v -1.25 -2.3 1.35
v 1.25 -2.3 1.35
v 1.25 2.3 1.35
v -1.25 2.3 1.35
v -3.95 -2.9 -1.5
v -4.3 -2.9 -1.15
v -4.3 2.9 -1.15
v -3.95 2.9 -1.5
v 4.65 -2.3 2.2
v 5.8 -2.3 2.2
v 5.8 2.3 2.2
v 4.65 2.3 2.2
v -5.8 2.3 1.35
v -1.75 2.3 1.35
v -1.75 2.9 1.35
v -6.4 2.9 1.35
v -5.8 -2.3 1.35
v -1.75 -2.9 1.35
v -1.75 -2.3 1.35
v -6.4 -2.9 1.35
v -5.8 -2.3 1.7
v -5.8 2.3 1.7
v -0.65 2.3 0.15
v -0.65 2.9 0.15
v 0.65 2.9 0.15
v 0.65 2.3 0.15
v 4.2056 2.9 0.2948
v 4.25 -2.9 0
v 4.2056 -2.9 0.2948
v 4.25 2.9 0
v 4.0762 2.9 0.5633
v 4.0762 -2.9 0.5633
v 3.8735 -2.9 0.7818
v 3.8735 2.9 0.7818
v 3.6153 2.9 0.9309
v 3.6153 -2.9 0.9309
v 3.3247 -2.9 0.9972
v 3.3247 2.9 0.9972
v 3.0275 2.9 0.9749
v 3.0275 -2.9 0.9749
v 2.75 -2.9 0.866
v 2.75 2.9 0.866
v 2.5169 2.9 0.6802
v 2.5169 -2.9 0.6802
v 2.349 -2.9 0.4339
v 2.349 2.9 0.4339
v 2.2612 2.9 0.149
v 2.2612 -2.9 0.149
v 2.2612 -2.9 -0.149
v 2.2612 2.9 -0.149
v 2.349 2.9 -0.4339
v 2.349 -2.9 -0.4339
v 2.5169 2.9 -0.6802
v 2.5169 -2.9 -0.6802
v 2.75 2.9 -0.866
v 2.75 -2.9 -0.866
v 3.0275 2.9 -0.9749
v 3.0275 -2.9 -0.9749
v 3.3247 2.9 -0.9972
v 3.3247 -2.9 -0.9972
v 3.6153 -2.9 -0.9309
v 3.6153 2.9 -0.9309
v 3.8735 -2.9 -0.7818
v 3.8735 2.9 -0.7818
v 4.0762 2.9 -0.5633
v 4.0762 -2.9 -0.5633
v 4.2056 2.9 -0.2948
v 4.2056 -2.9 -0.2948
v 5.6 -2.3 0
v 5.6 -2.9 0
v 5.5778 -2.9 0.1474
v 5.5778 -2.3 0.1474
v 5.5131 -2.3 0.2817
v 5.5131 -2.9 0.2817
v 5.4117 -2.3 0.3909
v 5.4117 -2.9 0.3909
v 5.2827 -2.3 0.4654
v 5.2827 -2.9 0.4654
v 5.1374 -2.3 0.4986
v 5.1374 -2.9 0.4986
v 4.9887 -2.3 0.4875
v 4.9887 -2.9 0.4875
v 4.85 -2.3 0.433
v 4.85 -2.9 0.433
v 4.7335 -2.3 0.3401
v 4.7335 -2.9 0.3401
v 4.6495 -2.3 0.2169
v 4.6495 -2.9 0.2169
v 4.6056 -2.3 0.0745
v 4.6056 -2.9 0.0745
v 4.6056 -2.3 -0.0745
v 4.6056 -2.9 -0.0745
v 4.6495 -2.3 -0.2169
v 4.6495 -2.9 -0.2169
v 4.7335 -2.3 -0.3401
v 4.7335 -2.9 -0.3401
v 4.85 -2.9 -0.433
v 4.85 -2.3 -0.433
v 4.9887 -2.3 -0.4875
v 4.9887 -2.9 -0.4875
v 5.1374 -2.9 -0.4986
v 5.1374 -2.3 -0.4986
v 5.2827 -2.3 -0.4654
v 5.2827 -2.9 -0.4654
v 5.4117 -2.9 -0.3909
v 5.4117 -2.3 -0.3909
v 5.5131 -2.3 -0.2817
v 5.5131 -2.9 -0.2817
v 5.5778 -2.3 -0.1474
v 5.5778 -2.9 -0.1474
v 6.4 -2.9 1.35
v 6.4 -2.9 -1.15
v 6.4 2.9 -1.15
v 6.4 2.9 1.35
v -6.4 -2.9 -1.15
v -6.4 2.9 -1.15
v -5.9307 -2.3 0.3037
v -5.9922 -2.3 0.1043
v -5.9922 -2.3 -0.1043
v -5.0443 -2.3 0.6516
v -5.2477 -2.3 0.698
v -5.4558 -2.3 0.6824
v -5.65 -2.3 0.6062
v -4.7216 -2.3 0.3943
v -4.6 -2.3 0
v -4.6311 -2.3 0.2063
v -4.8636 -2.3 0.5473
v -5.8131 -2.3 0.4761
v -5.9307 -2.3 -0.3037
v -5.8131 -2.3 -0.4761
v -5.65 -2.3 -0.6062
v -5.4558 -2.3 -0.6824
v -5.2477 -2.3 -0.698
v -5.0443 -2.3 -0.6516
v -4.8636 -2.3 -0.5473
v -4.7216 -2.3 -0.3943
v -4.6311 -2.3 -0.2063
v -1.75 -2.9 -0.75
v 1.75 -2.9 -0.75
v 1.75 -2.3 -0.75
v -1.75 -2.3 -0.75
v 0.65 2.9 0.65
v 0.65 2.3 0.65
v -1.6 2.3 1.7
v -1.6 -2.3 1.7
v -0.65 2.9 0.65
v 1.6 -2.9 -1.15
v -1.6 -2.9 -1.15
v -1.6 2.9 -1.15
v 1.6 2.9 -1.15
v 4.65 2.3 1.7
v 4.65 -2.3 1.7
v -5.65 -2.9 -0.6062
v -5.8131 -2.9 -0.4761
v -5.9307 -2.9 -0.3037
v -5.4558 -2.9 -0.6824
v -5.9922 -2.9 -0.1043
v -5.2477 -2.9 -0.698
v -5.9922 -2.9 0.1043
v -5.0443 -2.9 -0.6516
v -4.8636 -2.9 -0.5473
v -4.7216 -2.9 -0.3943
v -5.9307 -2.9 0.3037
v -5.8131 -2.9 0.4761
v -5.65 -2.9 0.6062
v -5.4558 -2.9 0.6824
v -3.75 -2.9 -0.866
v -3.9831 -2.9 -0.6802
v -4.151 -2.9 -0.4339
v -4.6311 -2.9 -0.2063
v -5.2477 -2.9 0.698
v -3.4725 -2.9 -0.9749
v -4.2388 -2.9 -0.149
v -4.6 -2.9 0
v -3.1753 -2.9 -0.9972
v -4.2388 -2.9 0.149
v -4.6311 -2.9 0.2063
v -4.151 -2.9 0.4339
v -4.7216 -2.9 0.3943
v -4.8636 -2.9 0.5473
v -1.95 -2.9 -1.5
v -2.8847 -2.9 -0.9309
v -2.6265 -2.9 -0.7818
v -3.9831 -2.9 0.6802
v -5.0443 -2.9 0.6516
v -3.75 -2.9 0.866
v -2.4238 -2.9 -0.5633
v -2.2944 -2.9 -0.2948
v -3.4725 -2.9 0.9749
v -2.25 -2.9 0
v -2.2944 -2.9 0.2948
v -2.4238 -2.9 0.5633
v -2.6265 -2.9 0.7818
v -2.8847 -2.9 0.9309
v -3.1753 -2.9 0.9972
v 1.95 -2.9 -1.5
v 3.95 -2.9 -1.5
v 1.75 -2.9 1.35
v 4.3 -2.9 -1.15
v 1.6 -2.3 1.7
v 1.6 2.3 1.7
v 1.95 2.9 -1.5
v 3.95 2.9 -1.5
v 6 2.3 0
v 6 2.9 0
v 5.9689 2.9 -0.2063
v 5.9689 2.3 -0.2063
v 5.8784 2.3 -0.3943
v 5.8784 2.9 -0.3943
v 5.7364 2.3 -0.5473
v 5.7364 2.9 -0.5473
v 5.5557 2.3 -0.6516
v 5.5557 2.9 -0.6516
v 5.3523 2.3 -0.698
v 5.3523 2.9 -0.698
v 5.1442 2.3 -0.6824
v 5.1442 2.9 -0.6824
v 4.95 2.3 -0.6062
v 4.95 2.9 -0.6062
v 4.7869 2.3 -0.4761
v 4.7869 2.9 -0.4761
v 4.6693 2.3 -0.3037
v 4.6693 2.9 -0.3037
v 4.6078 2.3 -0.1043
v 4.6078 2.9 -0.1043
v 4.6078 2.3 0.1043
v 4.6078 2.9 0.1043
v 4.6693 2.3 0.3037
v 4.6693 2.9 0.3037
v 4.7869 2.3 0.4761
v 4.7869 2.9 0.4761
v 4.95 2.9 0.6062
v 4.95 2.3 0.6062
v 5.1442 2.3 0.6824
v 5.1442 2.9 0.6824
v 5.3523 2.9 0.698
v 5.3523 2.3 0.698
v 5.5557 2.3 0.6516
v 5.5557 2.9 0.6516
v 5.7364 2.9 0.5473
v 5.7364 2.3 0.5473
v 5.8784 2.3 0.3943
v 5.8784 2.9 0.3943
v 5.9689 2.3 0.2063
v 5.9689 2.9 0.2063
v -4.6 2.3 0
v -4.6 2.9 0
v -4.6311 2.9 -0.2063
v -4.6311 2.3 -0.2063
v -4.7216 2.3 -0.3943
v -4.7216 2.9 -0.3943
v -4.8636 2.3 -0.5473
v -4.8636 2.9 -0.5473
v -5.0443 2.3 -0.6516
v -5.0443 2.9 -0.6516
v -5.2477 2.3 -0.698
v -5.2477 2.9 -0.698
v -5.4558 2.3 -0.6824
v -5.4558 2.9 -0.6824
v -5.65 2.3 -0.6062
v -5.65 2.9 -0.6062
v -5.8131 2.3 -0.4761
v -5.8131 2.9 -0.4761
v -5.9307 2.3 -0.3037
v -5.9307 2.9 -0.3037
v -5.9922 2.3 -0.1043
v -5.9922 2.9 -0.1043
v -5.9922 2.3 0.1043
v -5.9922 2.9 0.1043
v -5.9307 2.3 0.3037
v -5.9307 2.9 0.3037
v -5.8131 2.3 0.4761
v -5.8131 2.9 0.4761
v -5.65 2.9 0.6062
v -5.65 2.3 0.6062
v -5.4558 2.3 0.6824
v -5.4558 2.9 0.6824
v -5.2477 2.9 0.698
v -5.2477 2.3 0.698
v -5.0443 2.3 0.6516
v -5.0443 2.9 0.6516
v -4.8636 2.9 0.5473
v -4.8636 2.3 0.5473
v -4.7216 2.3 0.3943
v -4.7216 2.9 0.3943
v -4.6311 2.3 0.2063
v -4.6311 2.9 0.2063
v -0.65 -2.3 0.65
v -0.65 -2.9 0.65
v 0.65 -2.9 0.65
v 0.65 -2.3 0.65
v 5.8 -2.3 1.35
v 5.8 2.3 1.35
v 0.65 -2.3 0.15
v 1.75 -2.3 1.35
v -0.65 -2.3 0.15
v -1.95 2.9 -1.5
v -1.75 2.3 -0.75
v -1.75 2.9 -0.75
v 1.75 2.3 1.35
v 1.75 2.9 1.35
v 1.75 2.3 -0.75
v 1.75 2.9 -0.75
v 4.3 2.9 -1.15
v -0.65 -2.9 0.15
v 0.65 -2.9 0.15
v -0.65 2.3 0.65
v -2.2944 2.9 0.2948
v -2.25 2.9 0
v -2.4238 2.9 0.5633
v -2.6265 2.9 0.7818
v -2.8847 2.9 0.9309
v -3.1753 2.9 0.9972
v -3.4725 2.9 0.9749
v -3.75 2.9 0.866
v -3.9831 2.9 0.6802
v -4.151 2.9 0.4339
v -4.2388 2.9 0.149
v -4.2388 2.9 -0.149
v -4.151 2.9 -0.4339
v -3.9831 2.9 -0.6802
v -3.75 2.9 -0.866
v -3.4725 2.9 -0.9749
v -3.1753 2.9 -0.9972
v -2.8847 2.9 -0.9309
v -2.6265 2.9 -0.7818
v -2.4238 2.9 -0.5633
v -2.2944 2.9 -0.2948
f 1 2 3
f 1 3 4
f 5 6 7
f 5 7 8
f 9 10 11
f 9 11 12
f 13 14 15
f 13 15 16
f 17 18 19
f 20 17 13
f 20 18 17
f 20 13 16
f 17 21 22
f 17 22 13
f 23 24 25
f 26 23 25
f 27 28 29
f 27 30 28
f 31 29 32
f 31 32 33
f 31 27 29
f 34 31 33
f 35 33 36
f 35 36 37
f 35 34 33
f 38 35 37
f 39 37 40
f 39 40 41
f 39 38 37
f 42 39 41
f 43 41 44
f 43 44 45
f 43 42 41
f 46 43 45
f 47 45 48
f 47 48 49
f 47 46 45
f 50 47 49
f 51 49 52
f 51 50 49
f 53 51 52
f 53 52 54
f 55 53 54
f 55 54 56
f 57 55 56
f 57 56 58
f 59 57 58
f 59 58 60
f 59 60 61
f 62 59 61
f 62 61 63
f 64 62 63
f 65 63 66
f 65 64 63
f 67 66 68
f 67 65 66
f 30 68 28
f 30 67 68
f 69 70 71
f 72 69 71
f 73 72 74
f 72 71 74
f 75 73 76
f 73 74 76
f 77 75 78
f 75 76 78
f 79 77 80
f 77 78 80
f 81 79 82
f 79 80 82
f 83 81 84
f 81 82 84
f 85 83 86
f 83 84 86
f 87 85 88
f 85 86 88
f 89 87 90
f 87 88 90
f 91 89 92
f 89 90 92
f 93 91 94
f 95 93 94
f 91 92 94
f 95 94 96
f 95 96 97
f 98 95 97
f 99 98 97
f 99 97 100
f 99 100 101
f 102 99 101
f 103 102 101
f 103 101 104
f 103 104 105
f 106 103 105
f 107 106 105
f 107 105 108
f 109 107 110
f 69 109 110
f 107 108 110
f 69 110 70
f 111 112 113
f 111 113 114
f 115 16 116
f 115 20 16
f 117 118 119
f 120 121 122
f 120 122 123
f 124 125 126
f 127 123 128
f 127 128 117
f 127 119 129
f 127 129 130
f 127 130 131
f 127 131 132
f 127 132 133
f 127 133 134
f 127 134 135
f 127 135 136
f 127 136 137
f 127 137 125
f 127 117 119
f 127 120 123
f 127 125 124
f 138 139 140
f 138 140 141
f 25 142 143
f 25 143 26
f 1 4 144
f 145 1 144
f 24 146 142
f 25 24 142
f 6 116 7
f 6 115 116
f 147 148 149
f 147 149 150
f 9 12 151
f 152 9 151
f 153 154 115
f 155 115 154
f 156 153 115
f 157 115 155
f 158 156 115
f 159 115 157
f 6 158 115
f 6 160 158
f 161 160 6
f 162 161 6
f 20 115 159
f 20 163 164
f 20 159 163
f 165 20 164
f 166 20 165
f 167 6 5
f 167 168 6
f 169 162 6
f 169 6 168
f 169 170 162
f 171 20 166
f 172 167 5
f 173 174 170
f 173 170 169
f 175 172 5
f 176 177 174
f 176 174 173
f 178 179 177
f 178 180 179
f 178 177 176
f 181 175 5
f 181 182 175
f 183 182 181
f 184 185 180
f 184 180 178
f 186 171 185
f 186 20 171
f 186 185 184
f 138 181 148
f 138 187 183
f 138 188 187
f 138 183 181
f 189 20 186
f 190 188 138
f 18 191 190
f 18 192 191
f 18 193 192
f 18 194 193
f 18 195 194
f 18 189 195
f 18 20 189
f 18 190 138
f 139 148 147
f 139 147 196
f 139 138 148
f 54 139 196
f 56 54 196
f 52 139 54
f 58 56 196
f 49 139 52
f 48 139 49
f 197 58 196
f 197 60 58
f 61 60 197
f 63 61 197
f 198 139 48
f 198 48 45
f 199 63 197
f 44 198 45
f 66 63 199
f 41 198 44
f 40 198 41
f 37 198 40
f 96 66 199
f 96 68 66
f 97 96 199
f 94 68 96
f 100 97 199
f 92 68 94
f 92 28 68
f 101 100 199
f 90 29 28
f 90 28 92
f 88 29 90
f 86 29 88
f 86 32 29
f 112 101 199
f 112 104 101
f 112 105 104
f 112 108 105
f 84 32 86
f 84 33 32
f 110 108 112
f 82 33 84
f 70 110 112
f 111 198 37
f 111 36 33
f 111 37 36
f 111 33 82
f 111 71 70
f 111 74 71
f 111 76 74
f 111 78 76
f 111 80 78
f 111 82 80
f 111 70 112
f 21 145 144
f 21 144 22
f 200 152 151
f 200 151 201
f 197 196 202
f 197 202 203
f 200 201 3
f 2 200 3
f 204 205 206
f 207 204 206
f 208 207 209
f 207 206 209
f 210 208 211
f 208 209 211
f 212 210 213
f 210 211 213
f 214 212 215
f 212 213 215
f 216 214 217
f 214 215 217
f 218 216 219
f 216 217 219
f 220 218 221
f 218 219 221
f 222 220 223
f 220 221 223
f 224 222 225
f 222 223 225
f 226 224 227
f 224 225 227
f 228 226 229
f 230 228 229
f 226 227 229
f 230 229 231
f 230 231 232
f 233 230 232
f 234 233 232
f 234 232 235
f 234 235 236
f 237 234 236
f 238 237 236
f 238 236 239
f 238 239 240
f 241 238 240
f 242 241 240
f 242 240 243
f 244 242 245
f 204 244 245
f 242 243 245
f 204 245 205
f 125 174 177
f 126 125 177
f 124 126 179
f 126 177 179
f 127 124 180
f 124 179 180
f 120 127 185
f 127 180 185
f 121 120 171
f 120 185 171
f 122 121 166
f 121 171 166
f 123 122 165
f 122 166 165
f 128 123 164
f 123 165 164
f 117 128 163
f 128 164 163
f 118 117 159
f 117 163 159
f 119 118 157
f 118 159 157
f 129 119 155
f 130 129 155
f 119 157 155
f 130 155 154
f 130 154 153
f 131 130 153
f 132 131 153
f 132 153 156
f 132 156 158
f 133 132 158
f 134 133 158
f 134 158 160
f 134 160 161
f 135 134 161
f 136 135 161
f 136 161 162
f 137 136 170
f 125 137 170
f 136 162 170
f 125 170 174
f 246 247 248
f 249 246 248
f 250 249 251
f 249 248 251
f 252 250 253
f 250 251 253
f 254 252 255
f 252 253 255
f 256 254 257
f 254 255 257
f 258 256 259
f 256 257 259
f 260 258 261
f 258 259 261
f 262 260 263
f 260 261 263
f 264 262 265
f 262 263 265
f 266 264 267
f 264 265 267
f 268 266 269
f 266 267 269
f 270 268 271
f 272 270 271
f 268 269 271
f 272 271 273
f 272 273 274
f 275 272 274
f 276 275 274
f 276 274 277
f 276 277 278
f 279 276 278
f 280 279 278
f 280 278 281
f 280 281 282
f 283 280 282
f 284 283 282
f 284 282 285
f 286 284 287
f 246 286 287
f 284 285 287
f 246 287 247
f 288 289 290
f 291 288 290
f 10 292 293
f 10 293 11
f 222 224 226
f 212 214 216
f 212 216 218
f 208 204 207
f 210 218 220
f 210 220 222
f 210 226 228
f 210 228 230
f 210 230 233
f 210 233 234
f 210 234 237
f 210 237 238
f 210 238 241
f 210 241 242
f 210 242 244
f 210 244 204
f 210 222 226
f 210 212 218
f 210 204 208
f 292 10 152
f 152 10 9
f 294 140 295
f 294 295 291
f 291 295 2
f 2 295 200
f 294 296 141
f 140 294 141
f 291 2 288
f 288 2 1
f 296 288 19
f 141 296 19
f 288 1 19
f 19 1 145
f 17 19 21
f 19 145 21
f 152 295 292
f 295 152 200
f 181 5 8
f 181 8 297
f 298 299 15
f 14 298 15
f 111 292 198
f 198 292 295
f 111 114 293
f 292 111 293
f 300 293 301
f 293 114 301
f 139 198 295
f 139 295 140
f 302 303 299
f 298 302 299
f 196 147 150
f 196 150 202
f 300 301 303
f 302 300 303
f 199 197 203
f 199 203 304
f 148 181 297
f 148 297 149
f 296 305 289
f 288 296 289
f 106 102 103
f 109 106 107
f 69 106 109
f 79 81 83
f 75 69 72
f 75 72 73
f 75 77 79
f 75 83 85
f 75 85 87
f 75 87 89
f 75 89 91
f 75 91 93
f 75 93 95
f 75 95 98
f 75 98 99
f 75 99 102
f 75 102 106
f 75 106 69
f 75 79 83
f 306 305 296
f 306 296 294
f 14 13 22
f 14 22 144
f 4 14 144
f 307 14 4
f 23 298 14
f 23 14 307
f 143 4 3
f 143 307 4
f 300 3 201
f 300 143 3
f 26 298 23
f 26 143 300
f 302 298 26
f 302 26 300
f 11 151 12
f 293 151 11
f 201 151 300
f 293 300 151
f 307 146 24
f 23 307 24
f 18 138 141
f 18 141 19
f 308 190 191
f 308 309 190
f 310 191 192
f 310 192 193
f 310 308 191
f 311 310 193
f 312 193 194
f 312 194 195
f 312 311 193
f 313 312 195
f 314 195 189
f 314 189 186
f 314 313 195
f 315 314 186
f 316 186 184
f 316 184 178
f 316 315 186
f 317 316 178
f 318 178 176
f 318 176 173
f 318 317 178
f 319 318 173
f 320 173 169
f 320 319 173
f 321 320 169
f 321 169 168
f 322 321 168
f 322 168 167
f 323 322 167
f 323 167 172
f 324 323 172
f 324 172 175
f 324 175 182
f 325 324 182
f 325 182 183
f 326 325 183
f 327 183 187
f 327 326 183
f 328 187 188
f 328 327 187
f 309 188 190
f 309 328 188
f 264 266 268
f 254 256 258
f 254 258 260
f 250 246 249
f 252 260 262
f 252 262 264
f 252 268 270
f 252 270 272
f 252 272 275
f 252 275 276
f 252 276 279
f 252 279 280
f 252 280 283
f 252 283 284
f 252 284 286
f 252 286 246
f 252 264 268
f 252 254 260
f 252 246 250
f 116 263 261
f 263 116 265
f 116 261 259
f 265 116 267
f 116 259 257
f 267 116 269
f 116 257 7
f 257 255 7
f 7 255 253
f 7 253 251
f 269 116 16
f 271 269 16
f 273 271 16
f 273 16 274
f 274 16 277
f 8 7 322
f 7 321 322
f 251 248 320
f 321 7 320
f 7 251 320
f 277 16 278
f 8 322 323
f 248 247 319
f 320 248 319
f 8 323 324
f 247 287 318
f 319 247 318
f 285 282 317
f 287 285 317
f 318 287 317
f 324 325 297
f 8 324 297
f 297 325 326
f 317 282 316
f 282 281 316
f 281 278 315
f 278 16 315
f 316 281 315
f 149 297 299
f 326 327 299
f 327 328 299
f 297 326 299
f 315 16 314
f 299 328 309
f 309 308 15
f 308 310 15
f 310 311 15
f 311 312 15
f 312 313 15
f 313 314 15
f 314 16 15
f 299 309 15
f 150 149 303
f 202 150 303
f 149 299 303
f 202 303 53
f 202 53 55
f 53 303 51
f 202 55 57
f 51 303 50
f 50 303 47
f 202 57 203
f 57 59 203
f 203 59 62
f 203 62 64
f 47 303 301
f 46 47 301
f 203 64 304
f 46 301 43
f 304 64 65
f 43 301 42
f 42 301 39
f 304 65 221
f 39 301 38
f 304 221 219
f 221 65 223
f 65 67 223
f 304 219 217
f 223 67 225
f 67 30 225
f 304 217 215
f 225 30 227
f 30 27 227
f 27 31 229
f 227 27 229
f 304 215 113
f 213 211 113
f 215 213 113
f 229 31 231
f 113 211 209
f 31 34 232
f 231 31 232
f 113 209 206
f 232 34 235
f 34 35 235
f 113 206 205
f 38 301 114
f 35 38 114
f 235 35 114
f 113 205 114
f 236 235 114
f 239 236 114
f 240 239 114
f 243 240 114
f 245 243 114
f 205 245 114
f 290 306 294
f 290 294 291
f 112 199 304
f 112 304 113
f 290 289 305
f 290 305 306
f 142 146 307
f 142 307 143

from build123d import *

# Parameters (mm, degrees)
SKETCH022_R     = 1
PAD022_DEPTH    = 2.9
SKETCH026_R     = 0.7
SKETCH026_R_2   = 0.5
SKETCH026_W     = 1.3
SKETCH026_H     = 0.5
POCKET009_DEPTH = 0.6
SKETCH027_R     = 0.7
SKETCH027_W     = 1.3
SKETCH027_H     = 0.5
POCKET010_DEPTH = 0.6


with BuildPart() as part:
    # Sketch022 → Pad022 (new body, symmetric)
    with BuildSketch(Plane.XZ):
        Polygon((-6.4, -1.15), (-4.3, -1.15), (-3.95, -1.5), (-1.95, -1.5), (-1.6, -1.15), (1.6, -1.15), (1.95, -1.5), (3.95, -1.5), (4.3, -1.15), (6.4, -1.15), (6.4, 1.35), (5.8, 1.35), (5.8, 2.2), (4.65, 2.2), (4.65, 1.7), (1.6, 1.7), (1.25, 1.35), (-1.25, 1.35), (-1.6, 1.7), (-5.8, 1.7), (-5.8, 1.35), (-6.4, 1.35), align=None)
        with Locations((-3.25, 0)):
            Circle(SKETCH022_R, mode=Mode.SUBTRACT)
        with Locations((3.25, 0)):
            Circle(SKETCH022_R, mode=Mode.SUBTRACT)
    extrude(amount=PAD022_DEPTH, both=True)

    # Sketch026 (on Face26 of Pad022) → Pocket009 (cut)
    with BuildSketch(Plane.XZ.offset(2.9)):
        with Locations((-5.3, 0)):
            Circle(SKETCH026_R)
        with Locations((5.1, 0)):
            Circle(SKETCH026_R_2)
        Polygon((1.75, 1.35), (1.75, -0.75), (-1.75, -0.75), (-1.75, 1.35), (-6.4, 1.35), (-6.4, 2.2), (6.4, 2.2), (6.4, 1.35), align=None)
        with Locations((0, 0.4)):
            Rectangle(SKETCH026_W, SKETCH026_H, mode=Mode.SUBTRACT)
    extrude(amount=-POCKET009_DEPTH, mode=Mode.SUBTRACT)

    # Sketch027 (on Face4 of Pocket009) → Pocket010 (cut)
    with BuildSketch(Plane(origin=(0, 2.9, 0), x_dir=(1, 0, 0), z_dir=(0, 1, 0))):
        with Locations((5.3, 0)):
            Circle(SKETCH027_R)
        with Locations((-5.3, 0)):
            Circle(SKETCH027_R)
        Polygon((1.75, 0.75), (-1.75, 0.75), (-1.75, -1.35), (-6.4, -1.35), (-6.4, -2.2), (6.4, -2.2), (6.4, -1.35), (1.75, -1.35), align=None)
        with Locations((0, -0.4)):
            Rectangle(SKETCH027_W, SKETCH027_H, mode=Mode.SUBTRACT)
    extrude(amount=-POCKET010_DEPTH, mode=Mode.SUBTRACT)


solid = part.part
